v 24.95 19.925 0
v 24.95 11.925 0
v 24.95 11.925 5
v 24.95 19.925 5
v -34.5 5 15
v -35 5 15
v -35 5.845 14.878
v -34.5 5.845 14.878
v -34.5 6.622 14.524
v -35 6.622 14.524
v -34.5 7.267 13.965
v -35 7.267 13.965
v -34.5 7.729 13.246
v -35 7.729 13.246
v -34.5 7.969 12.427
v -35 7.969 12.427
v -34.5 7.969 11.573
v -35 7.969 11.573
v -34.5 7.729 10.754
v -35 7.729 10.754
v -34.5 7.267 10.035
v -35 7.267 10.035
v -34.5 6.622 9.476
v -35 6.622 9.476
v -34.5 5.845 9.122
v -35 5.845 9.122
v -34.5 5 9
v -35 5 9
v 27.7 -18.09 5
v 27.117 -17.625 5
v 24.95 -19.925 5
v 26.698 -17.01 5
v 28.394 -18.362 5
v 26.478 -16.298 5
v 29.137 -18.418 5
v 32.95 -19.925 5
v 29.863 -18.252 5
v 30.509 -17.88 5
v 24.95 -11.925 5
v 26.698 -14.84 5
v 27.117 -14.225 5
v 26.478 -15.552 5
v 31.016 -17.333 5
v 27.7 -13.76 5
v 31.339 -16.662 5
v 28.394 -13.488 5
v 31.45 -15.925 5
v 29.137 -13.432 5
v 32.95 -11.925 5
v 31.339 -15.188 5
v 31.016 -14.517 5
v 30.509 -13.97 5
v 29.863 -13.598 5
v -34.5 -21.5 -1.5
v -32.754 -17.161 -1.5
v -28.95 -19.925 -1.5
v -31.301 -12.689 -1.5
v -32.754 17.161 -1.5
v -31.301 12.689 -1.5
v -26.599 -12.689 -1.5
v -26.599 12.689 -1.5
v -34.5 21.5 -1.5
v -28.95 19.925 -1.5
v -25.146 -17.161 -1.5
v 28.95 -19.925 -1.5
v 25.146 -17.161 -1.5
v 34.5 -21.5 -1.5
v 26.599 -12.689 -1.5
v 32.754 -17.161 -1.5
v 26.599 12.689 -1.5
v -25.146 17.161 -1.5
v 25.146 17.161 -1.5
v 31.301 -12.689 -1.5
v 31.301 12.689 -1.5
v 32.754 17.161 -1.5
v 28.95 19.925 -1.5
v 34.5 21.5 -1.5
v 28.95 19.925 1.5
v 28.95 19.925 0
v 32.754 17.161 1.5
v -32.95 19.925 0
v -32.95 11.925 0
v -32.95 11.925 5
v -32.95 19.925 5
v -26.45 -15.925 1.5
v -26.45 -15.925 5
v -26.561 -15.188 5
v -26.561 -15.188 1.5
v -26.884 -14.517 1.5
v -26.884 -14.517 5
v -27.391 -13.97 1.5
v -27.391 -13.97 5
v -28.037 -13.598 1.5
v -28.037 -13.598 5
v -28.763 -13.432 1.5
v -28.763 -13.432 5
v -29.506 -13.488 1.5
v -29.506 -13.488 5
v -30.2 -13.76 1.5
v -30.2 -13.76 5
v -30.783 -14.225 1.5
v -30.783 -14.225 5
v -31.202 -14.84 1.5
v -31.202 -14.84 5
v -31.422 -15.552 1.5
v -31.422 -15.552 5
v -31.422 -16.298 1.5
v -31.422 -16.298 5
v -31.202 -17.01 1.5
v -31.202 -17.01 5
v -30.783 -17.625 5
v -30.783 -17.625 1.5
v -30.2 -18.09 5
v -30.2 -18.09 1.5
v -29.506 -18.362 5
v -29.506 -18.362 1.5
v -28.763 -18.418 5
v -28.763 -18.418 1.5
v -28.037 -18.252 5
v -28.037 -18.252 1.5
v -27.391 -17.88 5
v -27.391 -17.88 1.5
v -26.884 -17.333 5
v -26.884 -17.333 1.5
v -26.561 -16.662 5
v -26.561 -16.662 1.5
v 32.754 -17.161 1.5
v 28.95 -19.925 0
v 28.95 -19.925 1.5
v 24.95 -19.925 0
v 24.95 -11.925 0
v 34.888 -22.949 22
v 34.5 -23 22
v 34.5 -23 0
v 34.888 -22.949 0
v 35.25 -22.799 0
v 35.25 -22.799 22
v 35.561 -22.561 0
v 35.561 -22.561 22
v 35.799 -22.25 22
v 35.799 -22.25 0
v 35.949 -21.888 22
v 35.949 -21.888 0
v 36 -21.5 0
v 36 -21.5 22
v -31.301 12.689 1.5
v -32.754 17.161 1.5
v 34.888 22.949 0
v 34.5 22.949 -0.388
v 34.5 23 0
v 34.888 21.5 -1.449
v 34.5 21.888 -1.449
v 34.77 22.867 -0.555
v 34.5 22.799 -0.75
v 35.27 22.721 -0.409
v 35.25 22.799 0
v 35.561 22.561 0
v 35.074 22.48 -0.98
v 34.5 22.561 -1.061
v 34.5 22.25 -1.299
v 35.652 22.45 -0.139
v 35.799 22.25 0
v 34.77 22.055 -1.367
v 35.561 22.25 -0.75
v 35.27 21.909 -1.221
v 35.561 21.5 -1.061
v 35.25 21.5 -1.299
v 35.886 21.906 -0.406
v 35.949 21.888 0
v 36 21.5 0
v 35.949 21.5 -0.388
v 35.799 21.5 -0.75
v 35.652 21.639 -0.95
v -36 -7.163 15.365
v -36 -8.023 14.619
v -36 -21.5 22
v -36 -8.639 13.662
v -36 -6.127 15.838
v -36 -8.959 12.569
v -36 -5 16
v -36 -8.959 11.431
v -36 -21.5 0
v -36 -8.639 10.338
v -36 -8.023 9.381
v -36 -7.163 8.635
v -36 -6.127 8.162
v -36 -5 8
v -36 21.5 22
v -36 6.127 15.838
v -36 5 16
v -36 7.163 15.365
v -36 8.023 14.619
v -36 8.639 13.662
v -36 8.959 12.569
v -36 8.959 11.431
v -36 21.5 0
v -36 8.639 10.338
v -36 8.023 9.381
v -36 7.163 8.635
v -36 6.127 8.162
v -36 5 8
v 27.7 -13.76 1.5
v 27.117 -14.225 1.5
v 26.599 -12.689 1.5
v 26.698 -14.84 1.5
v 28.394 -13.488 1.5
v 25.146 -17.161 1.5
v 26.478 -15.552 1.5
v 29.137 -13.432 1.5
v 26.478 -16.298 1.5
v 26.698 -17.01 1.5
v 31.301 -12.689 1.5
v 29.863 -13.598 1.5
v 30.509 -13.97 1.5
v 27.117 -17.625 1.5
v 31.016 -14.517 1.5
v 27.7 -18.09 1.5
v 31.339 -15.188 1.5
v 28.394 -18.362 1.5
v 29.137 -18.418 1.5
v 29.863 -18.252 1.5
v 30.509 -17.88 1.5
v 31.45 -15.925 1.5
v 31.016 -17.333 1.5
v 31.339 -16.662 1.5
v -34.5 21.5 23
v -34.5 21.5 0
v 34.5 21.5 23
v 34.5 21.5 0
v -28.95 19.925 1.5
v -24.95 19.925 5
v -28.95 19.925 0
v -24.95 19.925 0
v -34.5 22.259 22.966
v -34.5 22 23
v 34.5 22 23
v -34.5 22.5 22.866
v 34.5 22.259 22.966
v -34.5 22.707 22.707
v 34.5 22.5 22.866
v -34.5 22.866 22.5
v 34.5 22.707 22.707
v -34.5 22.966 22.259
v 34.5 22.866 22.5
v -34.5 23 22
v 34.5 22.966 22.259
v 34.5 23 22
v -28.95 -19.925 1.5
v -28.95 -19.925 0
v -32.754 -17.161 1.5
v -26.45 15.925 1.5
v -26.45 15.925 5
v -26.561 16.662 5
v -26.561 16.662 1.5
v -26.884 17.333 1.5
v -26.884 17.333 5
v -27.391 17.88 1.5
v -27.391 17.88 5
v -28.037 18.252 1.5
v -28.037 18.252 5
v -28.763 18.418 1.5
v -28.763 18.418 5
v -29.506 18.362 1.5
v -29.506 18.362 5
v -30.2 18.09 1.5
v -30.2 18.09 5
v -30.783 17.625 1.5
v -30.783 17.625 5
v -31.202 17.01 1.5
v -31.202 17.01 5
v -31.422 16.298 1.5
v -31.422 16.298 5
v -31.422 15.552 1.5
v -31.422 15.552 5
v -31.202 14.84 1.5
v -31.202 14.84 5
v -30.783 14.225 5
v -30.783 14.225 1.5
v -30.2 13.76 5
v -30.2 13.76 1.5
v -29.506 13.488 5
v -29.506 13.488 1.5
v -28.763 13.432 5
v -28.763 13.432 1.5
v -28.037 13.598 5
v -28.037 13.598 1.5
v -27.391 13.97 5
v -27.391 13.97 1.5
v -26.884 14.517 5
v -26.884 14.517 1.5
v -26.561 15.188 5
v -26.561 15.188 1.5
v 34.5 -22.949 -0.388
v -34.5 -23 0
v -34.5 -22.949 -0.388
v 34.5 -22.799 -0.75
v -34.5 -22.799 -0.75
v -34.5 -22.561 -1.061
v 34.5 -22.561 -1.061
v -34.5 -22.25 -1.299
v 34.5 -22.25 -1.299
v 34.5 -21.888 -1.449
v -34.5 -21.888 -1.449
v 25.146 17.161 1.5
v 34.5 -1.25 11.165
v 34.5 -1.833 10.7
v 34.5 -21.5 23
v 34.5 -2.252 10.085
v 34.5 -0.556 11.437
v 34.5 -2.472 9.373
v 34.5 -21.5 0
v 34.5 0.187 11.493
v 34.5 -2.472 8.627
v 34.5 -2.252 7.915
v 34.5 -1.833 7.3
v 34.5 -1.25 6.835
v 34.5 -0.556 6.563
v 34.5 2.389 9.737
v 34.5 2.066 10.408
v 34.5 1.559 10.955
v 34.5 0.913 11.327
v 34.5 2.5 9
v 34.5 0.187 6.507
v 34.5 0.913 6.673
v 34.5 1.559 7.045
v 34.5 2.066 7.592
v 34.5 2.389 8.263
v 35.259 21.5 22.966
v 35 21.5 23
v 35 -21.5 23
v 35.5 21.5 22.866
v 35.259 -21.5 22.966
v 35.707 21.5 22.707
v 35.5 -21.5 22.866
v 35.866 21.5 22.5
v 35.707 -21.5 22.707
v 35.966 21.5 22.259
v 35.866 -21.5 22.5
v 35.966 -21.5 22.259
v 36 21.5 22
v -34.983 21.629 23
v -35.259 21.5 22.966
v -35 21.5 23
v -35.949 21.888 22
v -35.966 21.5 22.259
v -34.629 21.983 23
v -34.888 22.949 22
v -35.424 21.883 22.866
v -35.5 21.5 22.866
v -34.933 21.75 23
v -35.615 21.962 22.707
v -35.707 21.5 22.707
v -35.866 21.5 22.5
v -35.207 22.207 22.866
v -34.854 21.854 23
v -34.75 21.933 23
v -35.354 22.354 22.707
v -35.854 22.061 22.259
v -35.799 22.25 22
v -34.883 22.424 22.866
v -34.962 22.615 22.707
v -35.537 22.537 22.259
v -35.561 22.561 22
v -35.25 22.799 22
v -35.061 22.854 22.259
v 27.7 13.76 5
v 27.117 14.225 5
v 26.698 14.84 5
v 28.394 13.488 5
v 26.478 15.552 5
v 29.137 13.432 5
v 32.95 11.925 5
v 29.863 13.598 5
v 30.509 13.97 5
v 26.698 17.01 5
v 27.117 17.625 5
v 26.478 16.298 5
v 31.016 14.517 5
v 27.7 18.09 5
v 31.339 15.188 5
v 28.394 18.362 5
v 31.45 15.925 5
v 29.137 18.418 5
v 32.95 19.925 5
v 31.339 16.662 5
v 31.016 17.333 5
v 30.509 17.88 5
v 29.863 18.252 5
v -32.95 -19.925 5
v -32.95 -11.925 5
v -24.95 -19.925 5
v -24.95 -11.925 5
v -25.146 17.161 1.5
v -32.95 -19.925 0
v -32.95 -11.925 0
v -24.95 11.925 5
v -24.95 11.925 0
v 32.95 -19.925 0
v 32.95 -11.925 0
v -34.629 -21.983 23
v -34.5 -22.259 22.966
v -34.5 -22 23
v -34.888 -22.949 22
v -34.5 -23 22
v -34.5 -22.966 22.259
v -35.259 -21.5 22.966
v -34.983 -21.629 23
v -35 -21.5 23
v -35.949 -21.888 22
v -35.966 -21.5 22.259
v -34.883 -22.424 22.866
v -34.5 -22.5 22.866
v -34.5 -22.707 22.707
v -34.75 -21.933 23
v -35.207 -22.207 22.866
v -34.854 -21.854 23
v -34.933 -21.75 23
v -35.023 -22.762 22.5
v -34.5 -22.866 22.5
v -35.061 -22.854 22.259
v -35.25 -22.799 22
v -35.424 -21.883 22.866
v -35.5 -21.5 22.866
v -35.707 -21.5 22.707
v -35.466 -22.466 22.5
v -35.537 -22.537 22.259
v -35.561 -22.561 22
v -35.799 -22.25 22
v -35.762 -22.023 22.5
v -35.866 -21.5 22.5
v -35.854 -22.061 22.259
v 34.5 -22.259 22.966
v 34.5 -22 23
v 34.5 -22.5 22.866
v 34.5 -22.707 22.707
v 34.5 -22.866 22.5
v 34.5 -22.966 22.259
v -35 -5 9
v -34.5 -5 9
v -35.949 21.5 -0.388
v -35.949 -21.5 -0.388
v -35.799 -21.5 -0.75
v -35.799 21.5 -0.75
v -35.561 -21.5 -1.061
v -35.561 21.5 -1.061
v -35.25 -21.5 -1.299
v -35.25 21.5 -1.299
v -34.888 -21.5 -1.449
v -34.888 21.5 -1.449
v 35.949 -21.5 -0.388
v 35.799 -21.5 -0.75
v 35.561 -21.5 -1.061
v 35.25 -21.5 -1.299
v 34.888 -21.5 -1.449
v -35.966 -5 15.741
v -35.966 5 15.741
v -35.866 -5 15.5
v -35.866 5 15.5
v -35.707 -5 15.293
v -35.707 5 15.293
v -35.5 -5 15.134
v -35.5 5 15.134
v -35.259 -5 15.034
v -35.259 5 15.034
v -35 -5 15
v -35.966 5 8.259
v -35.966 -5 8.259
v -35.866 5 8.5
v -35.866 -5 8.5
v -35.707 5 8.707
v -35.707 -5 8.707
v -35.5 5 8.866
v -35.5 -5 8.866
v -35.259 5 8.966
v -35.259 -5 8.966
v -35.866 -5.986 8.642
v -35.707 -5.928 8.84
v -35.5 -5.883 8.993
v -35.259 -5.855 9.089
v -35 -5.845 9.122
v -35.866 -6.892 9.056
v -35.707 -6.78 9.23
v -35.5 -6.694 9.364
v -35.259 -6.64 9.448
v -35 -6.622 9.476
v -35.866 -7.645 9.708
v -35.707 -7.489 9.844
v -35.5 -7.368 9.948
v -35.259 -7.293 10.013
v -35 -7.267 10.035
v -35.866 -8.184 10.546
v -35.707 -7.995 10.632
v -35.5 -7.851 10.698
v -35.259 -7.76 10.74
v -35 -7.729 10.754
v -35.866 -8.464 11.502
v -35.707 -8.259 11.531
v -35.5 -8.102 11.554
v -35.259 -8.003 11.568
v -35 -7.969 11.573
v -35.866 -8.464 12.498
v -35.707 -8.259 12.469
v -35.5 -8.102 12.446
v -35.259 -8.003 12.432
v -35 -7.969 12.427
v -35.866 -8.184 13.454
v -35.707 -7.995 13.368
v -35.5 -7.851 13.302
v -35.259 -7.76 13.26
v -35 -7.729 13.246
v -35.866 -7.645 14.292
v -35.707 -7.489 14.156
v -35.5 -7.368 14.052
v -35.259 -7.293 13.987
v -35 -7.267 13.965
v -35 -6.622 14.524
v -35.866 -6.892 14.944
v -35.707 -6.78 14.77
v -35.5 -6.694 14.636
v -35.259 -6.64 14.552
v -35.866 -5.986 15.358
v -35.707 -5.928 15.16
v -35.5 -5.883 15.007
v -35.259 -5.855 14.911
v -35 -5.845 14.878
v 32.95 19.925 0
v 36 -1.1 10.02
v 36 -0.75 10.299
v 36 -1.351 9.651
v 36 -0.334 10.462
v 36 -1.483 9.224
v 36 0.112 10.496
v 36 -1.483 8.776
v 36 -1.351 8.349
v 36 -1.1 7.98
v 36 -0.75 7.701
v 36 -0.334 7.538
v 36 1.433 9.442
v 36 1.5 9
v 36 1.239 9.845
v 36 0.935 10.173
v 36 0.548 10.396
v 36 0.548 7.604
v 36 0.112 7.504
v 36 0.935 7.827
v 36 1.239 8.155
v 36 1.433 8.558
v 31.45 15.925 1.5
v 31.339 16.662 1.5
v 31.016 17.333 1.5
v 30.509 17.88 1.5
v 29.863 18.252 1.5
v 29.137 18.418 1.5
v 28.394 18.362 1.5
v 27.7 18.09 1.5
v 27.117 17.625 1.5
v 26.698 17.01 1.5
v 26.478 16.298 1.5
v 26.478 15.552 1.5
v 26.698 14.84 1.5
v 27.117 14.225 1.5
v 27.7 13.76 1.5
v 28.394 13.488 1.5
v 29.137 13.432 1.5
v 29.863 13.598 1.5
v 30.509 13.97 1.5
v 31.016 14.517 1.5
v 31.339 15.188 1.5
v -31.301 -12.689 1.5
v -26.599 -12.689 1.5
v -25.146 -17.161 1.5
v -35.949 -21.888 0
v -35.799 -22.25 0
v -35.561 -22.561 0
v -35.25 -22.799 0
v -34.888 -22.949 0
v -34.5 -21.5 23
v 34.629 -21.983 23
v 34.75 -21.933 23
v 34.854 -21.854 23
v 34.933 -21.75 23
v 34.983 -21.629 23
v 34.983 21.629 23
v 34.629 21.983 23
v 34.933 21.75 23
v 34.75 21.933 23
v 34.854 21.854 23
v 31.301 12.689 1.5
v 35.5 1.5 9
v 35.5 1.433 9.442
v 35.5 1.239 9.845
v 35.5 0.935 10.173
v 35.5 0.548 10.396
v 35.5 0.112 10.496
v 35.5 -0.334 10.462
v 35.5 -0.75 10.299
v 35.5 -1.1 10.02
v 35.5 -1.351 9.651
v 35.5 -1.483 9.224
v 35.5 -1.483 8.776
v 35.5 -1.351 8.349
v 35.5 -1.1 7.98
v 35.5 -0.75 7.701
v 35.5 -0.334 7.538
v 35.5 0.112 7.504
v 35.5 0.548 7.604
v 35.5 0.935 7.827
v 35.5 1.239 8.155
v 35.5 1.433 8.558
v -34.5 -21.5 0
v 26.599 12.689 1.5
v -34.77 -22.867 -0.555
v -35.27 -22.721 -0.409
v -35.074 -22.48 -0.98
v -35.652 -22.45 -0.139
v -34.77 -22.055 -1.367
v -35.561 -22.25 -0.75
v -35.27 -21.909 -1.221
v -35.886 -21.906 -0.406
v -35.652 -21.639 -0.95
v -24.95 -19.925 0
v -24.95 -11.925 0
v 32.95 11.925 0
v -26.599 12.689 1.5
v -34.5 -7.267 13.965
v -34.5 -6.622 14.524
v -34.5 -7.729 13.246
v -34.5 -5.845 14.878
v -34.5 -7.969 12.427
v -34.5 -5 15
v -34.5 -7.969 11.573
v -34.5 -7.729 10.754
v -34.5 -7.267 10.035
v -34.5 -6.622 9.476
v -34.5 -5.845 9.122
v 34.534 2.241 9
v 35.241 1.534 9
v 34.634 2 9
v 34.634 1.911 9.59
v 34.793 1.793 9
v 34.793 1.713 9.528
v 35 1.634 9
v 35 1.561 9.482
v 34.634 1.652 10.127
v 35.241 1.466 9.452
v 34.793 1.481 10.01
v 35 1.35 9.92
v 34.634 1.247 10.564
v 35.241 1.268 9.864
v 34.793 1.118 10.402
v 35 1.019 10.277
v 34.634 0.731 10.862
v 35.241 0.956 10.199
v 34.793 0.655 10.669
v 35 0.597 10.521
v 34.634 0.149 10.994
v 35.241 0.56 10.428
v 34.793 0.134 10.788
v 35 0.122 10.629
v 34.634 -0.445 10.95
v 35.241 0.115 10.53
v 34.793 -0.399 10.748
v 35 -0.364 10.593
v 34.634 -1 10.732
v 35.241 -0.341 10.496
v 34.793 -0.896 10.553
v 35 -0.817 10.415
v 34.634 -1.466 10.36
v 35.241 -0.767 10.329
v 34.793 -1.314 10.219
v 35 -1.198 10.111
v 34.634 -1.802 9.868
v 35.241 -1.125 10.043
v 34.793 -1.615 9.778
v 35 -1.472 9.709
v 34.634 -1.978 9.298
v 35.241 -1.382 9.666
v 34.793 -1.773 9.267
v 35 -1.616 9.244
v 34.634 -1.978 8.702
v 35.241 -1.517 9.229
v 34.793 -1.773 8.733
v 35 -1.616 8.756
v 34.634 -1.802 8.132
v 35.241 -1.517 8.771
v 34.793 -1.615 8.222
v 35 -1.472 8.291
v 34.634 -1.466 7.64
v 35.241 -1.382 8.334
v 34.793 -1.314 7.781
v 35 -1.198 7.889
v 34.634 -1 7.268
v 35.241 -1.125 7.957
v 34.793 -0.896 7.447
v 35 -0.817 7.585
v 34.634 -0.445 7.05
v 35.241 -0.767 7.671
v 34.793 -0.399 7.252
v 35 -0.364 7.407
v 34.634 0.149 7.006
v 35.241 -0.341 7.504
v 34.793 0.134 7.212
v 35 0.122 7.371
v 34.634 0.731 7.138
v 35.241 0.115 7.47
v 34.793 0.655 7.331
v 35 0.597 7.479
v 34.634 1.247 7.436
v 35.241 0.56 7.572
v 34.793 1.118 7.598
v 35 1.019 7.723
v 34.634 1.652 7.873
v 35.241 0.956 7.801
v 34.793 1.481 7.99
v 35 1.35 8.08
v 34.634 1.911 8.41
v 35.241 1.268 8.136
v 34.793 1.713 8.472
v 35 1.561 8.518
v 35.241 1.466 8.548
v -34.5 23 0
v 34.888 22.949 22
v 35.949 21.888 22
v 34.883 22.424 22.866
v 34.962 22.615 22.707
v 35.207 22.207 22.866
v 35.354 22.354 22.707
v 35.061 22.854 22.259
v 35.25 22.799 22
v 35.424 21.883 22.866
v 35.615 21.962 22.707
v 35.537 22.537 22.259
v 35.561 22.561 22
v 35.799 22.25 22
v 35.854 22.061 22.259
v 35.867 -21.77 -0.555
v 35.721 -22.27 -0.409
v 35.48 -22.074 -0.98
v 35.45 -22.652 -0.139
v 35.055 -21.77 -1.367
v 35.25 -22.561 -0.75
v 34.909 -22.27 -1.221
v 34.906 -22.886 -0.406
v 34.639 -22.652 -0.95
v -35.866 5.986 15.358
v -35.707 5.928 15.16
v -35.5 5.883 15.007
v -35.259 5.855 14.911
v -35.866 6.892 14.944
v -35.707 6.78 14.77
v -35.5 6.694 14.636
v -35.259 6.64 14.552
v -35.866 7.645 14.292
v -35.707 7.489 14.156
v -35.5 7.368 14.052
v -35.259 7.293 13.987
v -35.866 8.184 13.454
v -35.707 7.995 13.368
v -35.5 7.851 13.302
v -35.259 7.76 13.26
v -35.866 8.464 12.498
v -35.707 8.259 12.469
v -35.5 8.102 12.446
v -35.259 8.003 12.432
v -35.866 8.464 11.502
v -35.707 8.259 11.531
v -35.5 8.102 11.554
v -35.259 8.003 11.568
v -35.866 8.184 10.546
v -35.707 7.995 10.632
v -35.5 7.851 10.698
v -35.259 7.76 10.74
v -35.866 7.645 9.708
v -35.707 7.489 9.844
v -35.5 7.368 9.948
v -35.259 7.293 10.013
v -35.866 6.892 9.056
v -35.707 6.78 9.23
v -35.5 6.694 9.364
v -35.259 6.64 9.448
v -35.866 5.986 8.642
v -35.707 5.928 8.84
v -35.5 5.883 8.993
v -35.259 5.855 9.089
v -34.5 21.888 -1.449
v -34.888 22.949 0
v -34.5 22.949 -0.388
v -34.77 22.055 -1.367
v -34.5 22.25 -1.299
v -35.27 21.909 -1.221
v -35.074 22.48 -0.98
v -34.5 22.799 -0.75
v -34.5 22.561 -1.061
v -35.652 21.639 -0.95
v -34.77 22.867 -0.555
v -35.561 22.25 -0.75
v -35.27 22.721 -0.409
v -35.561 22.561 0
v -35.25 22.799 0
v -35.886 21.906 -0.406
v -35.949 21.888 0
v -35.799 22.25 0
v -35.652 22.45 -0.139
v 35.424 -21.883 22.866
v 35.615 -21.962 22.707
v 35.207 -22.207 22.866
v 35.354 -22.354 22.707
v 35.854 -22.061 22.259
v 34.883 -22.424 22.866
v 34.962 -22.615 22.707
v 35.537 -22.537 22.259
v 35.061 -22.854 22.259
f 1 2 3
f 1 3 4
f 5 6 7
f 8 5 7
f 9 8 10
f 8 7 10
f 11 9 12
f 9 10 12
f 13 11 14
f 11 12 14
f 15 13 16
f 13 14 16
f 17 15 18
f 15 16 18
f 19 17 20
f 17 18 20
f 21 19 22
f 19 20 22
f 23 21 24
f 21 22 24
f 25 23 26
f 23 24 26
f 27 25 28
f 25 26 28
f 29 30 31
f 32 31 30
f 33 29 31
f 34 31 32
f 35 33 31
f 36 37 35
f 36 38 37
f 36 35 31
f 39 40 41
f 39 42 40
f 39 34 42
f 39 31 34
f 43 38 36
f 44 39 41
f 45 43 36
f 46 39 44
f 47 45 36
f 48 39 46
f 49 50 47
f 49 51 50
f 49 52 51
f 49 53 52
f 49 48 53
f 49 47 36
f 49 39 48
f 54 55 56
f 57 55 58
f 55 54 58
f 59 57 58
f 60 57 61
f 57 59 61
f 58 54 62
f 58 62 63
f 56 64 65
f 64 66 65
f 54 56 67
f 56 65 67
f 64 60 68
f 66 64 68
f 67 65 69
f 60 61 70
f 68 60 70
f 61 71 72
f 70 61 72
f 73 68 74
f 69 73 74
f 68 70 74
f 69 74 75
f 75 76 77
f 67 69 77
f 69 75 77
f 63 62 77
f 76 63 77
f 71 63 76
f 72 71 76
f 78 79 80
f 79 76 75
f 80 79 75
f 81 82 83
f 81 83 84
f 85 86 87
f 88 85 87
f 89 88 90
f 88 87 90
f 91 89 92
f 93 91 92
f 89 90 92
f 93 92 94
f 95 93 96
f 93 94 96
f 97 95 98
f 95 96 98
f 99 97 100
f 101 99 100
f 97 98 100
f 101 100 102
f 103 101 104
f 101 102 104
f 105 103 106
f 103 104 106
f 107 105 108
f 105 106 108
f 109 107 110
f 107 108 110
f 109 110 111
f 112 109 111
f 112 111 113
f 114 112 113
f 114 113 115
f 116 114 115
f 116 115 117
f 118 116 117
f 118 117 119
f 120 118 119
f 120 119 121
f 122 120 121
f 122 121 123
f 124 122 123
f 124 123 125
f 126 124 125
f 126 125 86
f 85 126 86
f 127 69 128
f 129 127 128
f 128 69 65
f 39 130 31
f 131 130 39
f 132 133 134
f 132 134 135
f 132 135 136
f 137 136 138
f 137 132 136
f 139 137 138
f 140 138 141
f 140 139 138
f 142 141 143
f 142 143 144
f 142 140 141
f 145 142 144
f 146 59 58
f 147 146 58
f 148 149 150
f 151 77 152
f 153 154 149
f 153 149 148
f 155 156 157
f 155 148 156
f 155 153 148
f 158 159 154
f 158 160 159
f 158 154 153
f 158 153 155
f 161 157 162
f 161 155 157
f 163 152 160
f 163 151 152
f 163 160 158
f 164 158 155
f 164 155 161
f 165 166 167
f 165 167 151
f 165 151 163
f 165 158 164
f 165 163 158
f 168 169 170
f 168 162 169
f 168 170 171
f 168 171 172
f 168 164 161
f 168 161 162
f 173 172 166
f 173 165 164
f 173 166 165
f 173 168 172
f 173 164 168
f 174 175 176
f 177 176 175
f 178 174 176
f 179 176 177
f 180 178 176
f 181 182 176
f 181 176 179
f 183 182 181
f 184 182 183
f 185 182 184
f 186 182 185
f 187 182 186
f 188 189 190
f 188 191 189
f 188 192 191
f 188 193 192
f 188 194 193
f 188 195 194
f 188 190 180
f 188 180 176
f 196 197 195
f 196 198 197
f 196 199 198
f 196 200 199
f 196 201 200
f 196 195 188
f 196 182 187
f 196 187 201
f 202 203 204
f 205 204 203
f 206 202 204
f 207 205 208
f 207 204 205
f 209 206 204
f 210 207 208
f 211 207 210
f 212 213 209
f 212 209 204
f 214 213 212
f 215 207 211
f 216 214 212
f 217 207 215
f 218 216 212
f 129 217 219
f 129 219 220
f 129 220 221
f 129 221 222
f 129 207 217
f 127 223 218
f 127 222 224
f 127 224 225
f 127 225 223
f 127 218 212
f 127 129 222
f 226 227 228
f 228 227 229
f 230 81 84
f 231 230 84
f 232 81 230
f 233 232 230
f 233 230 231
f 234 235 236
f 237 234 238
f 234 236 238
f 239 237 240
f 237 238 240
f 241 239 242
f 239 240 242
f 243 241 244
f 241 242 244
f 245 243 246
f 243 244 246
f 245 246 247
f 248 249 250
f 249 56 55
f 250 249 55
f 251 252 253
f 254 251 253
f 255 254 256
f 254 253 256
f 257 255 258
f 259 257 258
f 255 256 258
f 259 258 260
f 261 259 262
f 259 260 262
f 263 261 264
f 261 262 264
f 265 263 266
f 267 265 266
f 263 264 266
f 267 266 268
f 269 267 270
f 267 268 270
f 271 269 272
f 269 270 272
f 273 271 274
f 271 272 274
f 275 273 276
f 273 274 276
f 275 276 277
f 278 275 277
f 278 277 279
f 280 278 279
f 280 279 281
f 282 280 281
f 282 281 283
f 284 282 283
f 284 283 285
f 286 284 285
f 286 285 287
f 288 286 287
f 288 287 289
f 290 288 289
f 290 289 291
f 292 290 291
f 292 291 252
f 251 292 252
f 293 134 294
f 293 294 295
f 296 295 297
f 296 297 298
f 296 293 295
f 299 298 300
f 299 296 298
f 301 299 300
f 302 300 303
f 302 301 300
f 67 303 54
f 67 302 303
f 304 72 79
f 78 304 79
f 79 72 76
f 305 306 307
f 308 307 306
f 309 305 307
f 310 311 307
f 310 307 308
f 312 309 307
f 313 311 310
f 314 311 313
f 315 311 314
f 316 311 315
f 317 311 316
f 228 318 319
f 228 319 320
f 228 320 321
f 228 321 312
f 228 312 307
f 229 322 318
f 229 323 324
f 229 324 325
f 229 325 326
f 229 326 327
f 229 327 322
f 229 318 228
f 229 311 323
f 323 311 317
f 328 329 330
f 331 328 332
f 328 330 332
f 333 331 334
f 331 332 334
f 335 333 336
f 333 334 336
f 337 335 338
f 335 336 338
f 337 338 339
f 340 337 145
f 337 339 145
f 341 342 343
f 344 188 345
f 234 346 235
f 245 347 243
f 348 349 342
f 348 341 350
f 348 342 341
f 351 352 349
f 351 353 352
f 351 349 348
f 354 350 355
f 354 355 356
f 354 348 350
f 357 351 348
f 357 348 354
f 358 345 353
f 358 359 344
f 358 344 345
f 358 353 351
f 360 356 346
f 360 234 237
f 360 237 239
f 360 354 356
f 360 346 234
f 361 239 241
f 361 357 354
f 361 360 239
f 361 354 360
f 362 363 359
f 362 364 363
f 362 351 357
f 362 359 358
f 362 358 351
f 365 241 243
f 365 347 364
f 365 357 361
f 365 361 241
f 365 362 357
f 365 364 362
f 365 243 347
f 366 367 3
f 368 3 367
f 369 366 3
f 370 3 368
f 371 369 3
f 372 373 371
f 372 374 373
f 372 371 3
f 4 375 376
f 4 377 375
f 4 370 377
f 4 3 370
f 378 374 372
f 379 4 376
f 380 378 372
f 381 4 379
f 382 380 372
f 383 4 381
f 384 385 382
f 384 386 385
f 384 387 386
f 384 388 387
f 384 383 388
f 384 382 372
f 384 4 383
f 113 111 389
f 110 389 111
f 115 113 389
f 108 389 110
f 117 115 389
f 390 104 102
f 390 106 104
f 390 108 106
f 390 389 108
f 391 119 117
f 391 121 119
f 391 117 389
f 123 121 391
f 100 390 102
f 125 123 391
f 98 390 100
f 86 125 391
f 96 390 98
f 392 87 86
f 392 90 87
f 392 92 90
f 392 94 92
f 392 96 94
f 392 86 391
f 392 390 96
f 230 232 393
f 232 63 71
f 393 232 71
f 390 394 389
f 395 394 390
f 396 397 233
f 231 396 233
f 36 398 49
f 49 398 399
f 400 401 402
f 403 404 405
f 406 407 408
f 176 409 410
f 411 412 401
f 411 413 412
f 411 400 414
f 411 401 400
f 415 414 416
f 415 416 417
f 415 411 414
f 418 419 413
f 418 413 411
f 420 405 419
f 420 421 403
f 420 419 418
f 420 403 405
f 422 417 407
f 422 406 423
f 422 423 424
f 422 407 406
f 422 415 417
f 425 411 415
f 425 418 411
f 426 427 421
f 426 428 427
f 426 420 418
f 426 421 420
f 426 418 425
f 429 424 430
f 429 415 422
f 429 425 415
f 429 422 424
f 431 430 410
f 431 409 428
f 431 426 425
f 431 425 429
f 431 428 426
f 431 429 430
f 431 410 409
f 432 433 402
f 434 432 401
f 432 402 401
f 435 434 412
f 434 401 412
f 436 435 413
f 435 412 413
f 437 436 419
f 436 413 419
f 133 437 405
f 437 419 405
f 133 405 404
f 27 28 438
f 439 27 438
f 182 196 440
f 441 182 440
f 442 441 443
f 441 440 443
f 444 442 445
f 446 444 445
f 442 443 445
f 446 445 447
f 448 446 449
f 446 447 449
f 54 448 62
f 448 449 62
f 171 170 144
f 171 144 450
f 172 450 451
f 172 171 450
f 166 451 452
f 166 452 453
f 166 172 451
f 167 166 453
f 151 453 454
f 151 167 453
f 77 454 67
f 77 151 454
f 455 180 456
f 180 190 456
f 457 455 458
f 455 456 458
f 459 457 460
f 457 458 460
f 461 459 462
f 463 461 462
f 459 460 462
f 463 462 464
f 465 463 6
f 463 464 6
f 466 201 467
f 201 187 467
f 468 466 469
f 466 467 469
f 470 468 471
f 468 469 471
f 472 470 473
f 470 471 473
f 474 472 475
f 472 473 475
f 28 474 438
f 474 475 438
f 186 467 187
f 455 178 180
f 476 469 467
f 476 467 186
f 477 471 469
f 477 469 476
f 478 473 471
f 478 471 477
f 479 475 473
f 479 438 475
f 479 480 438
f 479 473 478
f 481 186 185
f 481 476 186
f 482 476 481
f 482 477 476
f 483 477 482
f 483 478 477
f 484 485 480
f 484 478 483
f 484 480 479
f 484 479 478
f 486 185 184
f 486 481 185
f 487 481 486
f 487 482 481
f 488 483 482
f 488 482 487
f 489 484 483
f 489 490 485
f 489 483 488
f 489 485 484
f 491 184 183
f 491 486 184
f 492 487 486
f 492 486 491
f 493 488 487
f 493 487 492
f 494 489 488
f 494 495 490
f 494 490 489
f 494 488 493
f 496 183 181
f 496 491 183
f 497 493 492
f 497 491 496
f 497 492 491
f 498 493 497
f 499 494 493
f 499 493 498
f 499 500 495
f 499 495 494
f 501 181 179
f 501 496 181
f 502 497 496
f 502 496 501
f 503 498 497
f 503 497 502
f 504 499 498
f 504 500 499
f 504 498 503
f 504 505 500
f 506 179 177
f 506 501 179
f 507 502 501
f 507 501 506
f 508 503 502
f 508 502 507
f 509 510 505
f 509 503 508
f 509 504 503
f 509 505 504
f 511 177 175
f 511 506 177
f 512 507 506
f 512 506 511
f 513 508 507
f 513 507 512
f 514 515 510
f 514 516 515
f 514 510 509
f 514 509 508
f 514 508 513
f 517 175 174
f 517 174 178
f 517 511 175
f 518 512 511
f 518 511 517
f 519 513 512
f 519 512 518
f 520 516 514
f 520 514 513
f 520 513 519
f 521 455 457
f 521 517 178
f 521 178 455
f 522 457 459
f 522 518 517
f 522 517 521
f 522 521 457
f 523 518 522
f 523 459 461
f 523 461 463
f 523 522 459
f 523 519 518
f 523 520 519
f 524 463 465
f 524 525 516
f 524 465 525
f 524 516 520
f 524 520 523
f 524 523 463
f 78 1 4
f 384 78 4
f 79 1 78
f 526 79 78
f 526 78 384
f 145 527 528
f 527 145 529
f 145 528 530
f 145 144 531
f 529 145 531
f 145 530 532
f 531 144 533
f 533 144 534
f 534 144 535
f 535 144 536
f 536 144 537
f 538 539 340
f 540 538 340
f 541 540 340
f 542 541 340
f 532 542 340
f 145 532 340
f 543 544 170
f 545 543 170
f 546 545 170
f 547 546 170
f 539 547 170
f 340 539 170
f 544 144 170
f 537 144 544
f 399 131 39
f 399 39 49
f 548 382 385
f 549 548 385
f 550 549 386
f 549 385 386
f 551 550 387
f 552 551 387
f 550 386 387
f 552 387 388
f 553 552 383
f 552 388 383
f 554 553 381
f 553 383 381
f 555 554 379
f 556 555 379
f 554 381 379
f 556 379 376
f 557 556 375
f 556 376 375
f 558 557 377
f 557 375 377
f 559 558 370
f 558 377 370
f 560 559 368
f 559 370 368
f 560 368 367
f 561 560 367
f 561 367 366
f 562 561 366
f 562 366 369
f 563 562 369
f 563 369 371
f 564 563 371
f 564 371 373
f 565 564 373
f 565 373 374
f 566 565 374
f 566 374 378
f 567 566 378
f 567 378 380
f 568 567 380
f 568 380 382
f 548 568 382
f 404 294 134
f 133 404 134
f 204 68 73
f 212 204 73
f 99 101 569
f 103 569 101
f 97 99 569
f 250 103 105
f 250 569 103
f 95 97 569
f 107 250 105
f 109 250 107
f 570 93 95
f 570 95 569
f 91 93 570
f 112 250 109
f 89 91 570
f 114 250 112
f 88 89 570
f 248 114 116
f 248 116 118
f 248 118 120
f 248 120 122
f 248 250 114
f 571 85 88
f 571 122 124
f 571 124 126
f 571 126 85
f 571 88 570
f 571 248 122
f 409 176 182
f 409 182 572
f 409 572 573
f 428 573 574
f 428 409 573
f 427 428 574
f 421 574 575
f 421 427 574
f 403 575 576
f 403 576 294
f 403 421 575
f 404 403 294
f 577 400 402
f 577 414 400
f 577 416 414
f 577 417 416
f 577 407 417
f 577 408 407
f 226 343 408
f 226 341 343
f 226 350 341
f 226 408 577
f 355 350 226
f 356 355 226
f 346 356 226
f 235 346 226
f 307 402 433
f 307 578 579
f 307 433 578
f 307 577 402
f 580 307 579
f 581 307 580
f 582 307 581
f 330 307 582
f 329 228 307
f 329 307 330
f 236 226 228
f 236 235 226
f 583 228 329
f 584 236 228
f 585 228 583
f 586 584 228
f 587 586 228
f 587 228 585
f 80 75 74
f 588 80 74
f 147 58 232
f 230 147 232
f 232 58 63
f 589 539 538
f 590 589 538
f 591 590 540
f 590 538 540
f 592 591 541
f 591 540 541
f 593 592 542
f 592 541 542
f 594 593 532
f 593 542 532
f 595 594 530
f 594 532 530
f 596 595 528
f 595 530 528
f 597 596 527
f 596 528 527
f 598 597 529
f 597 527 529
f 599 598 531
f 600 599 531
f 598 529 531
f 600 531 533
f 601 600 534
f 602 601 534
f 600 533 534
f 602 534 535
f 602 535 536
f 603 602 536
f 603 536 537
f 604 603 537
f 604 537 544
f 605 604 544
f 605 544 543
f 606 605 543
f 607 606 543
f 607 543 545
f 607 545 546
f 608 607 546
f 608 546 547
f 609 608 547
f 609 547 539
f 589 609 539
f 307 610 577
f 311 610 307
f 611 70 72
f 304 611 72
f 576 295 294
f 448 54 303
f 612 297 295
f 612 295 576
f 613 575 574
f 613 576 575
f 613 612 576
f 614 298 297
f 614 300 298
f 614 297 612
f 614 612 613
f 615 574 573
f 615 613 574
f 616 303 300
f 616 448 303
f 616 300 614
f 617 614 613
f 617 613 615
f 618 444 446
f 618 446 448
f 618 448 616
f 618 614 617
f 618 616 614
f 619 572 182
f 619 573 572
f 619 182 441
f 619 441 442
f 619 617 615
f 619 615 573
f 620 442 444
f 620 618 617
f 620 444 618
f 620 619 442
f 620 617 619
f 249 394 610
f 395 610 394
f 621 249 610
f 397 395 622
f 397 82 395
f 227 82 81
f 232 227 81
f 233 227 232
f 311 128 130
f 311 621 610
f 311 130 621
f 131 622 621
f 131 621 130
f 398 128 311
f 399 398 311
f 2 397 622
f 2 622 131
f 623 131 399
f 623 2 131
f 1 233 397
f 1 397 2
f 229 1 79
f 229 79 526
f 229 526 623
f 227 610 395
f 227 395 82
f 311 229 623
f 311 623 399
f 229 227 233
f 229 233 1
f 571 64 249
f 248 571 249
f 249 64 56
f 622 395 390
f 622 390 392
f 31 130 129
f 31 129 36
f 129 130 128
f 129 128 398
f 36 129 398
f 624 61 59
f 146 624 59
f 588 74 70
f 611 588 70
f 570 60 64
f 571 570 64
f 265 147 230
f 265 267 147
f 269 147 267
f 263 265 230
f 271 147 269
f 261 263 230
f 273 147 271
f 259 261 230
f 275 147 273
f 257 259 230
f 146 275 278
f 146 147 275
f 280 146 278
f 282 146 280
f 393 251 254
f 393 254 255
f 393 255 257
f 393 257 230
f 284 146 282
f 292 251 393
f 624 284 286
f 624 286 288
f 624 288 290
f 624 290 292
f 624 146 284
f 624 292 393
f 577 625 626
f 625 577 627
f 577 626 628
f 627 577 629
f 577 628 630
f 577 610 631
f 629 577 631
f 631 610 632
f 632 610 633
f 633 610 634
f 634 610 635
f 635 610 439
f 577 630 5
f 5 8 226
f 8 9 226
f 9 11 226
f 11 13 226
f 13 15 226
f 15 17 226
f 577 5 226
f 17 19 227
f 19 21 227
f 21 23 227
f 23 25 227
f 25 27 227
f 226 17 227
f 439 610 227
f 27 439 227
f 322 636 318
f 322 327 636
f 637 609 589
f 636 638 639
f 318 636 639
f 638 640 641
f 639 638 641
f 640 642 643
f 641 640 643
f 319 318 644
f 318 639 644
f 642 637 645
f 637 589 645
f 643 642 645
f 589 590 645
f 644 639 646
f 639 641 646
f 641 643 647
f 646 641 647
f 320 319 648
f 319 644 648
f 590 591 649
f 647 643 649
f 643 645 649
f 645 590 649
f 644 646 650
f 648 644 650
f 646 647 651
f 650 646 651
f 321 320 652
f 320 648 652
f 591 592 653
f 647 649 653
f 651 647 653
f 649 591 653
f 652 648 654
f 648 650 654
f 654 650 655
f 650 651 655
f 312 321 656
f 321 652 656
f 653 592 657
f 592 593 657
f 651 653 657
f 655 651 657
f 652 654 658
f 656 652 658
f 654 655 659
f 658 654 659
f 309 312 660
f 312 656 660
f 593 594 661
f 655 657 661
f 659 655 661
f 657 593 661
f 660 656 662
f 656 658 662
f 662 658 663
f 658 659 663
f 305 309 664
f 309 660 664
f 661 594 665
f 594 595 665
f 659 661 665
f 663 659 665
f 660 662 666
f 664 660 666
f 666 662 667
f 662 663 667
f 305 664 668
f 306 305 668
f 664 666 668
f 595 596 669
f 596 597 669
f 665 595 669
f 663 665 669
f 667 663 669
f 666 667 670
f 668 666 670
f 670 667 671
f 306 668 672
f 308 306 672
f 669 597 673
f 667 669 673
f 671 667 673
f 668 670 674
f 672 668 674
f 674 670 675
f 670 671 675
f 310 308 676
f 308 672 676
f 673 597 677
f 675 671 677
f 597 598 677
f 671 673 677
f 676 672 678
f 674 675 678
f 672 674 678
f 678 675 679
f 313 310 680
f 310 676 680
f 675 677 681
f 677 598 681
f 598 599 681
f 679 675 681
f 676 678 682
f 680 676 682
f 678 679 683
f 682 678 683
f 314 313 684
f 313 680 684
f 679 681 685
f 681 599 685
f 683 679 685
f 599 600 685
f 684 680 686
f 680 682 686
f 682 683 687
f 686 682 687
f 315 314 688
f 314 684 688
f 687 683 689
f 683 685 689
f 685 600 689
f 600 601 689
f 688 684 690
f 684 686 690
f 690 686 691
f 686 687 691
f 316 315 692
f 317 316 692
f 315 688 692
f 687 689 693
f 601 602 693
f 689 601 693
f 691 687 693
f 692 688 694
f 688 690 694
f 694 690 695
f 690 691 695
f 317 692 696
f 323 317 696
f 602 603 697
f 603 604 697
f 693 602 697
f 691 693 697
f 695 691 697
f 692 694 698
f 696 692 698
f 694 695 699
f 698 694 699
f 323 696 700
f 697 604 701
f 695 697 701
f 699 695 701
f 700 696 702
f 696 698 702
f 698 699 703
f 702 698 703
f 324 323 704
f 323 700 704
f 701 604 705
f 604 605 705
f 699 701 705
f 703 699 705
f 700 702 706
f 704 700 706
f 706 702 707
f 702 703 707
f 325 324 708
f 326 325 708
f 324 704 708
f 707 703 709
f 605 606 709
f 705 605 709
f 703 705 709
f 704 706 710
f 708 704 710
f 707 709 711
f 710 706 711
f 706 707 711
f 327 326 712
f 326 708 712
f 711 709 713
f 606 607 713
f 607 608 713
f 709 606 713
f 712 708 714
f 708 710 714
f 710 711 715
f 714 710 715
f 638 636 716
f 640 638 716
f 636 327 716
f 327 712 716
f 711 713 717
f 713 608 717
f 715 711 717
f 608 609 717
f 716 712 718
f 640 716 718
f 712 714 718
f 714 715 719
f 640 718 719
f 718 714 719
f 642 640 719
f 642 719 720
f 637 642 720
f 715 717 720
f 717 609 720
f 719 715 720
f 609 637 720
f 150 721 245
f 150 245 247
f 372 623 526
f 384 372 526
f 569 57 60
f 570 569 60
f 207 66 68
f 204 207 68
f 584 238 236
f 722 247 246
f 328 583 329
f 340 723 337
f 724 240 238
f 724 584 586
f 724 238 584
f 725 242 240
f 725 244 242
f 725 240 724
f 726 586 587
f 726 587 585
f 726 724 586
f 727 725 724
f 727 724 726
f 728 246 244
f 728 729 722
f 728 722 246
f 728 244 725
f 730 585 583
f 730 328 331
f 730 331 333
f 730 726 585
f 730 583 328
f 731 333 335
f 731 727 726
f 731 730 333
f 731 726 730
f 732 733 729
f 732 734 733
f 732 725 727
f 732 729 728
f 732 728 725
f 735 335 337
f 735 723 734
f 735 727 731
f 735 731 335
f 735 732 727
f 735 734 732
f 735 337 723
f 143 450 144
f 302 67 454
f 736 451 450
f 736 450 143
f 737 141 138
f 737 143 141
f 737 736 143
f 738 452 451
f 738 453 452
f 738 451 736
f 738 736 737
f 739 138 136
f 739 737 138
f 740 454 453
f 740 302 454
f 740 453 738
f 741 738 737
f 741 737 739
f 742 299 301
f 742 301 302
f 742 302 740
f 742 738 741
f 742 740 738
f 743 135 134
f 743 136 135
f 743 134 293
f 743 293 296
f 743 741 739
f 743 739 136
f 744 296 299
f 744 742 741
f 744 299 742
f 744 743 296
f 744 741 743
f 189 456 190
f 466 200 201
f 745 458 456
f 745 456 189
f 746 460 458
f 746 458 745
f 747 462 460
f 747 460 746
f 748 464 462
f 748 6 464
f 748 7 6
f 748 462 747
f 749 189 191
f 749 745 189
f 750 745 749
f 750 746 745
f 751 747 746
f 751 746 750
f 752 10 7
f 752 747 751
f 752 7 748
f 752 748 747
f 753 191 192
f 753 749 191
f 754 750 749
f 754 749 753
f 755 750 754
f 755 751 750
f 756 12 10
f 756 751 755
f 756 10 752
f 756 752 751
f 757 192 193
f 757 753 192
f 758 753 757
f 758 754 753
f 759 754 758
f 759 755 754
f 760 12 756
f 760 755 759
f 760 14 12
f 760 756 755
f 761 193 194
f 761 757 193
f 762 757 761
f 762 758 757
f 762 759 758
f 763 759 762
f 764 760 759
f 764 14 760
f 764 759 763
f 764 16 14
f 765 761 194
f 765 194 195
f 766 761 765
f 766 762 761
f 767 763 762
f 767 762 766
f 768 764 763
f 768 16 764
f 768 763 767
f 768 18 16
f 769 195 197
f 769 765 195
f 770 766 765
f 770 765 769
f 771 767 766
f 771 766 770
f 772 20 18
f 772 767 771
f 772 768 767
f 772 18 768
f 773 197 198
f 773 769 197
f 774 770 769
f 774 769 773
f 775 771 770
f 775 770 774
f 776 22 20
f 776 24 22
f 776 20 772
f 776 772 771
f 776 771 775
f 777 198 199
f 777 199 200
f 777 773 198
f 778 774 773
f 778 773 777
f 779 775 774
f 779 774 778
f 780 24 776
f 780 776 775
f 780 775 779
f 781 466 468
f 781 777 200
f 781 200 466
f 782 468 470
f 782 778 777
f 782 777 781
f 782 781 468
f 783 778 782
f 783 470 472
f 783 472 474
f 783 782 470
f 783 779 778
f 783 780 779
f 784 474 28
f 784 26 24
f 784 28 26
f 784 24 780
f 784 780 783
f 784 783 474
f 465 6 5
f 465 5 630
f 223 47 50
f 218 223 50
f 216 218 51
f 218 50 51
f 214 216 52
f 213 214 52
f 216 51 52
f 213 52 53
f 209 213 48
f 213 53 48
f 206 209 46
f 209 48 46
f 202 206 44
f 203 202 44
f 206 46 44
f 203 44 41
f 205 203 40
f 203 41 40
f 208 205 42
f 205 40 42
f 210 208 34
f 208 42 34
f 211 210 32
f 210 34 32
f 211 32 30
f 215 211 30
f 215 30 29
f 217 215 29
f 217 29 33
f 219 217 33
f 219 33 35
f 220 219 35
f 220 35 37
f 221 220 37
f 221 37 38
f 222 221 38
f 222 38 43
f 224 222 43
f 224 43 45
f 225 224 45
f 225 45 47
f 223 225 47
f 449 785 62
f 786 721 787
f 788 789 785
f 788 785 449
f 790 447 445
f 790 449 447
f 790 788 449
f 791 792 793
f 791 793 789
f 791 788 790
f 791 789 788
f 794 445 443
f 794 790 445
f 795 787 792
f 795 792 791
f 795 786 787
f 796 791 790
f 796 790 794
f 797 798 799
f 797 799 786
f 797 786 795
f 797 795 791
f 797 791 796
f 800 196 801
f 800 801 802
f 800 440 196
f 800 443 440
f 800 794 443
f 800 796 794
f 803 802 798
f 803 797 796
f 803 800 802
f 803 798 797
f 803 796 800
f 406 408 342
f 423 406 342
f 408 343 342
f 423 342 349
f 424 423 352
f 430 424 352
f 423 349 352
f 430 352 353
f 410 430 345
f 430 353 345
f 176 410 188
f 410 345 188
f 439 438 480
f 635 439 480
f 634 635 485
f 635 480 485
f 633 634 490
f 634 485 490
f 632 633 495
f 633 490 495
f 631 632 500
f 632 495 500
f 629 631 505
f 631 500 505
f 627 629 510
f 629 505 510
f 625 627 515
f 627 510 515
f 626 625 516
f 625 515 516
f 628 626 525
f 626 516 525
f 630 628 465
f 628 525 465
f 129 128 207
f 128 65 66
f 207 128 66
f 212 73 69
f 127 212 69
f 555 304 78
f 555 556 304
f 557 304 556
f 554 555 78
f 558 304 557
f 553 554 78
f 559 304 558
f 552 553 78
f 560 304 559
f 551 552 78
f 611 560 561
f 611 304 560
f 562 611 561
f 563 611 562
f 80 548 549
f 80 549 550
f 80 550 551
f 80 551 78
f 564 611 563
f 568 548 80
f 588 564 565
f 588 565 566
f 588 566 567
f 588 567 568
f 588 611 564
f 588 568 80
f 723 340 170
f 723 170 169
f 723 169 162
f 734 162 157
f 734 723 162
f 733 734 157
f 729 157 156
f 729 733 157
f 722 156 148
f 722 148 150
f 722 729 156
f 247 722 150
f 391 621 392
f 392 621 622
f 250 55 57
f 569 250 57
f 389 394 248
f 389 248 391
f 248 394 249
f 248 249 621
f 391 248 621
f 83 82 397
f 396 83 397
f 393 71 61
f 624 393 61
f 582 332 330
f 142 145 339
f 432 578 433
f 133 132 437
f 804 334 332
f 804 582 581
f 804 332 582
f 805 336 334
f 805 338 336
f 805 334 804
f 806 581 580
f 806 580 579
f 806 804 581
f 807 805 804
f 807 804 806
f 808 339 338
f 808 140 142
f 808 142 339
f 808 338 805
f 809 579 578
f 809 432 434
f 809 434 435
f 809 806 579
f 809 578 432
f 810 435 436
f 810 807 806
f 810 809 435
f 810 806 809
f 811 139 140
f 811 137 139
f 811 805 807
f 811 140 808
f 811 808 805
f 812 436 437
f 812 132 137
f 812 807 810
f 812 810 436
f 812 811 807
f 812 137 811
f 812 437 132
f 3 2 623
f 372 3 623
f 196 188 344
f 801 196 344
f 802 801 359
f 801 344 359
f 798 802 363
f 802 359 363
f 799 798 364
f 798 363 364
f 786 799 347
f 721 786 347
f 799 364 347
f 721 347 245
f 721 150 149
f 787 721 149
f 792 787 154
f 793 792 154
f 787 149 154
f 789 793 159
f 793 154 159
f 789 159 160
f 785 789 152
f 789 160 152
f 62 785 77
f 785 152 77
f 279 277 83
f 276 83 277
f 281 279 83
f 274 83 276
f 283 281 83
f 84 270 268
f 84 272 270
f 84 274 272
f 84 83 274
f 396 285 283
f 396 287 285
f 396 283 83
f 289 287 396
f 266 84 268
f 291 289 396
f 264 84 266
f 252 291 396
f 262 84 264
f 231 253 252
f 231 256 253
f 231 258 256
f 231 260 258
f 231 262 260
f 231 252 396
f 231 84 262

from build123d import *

# Parameters (mm, degrees)
SKETCH_W        = 69
SKETCH_H        = 43
PAD_DEPTH       = 23
THICKNESS_T     = 1.5
SKETCH001_R     = 1.5
HOLE_DEPTH      = 2.098709
HOLE_TIPS_R     = 1.5
POCKET_DEPTH    = 5
SKETCH003_W     = 8
SKETCH003_H     = 8
PAD001_DEPTH    = 5
SKETCH007_R     = 2.5
POCKET003_DEPTH = 7
SKETCH008_R     = 2.5
POCKET004_DEPTH = 7
SKETCH009_R     = 2.5
POCKET005_DEPTH = 7
SKETCH010_R     = 2.5
POCKET006_DEPTH = 7
POCKET007_DEPTH = 3
FILLET_R        = 1
FILLET001_R     = 1


with BuildPart() as part:
    # Sketch → Pad (new body)
    with BuildSketch(Plane.XY):
        Rectangle(SKETCH_W, SKETCH_H)
    extrude(amount=PAD_DEPTH)

    # Thickness
    thickness_openings = [part.faces().sort_by_distance(p)[0] for p in [
        (0, 0, 23),
    ]]
    offset(amount=THICKNESS_T, openings=thickness_openings)

    # Sketch001 (on Face10 of Thickness) → Hole (cut)
    with BuildSketch(Plane.YZ.offset(36)):
        with Locations((0, 9)):
            Circle(SKETCH001_R)
    extrude(amount=-HOLE_DEPTH, mode=Mode.SUBTRACT)

    # Hole tips → Hole tip 1 section 0
    with BuildSketch(Plane.YZ.offset(33.901291), mode=Mode.PRIVATE) as hole_tip_1_s0:
        with Locations((0, 9)):
            Circle(HOLE_TIPS_R)
    loft([hole_tip_1_s0.sketch, Vertex(33, 0, 9)], mode=Mode.SUBTRACT)

    # Sketch002 (on Face9 of Hole) → Pocket (cut)
    with BuildSketch(Plane(origin=(-36, 0, 0), x_dir=(0, -1, 0), z_dir=(-1, 0, 0))):
        with BuildLine():
            ThreePointArc((-5, 15), (-8, 12), (-5, 9))
            Line((-5, 9), (5, 9))
            ThreePointArc((5, 9), (8, 12), (5, 15))
            Line((-5, 15), (5, 15))
        make_face()
    extrude(amount=-POCKET_DEPTH, mode=Mode.SUBTRACT)

    # Sketch003 (on Face4 of Pocket) → Pad001 (join)
    with BuildSketch(Plane.XY):
        with Locations((-28.95, 15.925)):
            Rectangle(SKETCH003_W, SKETCH003_H)
        with Locations((28.95, 15.925)):
            Rectangle(SKETCH003_W, SKETCH003_H)
        with Locations((-28.95, -15.925)):
            Rectangle(SKETCH003_W, SKETCH003_H)
        with Locations((28.95, -15.925)):
            Rectangle(SKETCH003_W, SKETCH003_H)
    extrude(amount=PAD001_DEPTH)

    # Sketch007 (on Face39 of Pad001) → Pocket003 (cut)
    with BuildSketch(Plane.XY.offset(5)):
        with Locations((-28.95, 15.925)):
            Circle(SKETCH007_R)
    extrude(amount=-POCKET003_DEPTH, mode=Mode.SUBTRACT)

    # Sketch008 (on Face38 of Pocket003) → Pocket004 (cut)
    with BuildSketch(Plane.XY.offset(5)):
        with Locations((28.95, 15.925)):
            Circle(SKETCH008_R)
    extrude(amount=-POCKET004_DEPTH, mode=Mode.SUBTRACT)

    # Sketch009 (on Face37 of Pocket004) → Pocket005 (cut)
    with BuildSketch(Plane.XY.offset(5)):
        with Locations((-28.95, -15.925)):
            Circle(SKETCH009_R)
    extrude(amount=-POCKET005_DEPTH, mode=Mode.SUBTRACT)

    # Sketch010 (on Face36 of Pocket005) → Pocket006 (cut)
    with BuildSketch(Plane.XY.offset(5)):
        with Locations((28.95, -15.925)):
            Circle(SKETCH010_R)
    extrude(amount=-POCKET006_DEPTH, mode=Mode.SUBTRACT)

    # Sketch011 (on Face52 of Pocket006) → Pocket007 (cut)
    with BuildSketch(Plane(origin=(0, 0, -1.5), x_dir=(1, 0, 0), z_dir=(0, 0, -1))):
        Polygon((-25.145774, 17.161068), (-28.95, 19.925), (-32.754226, 17.161068), (-31.301141, 12.688932), (-26.598859, 12.688932), align=None)
        Polygon((26.598859, 12.688932), (31.301141, 12.688932), (32.754226, 17.161068), (28.95, 19.925), (25.145774, 17.161068), align=None)
        Polygon((-26.598859, -12.688932), (-31.301141, -12.688932), (-32.754226, -17.161068), (-28.95, -19.925), (-25.145774, -17.161068), align=None)
        Polygon((26.598859, -12.688932), (25.145774, -17.161068), (28.95, -19.925), (32.754226, -17.161068), (31.301141, -12.688932), align=None)
    extrude(amount=-POCKET007_DEPTH, mode=Mode.SUBTRACT)

    # Fillet
    fillet_edges = [part.edges().sort_by_distance(p)[0] for p in [
        (34.5, 0, 10.5),
    ]]
    fillet(fillet_edges, radius=FILLET_R)

    # Fillet001
    fillet001_edges = [part.edges().sort_by_distance(p)[0] for p in [
        (-36, 0, 0),
        (-36, -21.5, 11.5),
        (-36, 21.5, 11.5),
        (-36, 0, 23),
        (-36, 8, 12),
        (-36, 0, 9),
        (-36, -8, 12),
        (-36, 0, 15),
    ]]
    fillet(fillet001_edges, radius=FILLET001_R)


solid = part.part
